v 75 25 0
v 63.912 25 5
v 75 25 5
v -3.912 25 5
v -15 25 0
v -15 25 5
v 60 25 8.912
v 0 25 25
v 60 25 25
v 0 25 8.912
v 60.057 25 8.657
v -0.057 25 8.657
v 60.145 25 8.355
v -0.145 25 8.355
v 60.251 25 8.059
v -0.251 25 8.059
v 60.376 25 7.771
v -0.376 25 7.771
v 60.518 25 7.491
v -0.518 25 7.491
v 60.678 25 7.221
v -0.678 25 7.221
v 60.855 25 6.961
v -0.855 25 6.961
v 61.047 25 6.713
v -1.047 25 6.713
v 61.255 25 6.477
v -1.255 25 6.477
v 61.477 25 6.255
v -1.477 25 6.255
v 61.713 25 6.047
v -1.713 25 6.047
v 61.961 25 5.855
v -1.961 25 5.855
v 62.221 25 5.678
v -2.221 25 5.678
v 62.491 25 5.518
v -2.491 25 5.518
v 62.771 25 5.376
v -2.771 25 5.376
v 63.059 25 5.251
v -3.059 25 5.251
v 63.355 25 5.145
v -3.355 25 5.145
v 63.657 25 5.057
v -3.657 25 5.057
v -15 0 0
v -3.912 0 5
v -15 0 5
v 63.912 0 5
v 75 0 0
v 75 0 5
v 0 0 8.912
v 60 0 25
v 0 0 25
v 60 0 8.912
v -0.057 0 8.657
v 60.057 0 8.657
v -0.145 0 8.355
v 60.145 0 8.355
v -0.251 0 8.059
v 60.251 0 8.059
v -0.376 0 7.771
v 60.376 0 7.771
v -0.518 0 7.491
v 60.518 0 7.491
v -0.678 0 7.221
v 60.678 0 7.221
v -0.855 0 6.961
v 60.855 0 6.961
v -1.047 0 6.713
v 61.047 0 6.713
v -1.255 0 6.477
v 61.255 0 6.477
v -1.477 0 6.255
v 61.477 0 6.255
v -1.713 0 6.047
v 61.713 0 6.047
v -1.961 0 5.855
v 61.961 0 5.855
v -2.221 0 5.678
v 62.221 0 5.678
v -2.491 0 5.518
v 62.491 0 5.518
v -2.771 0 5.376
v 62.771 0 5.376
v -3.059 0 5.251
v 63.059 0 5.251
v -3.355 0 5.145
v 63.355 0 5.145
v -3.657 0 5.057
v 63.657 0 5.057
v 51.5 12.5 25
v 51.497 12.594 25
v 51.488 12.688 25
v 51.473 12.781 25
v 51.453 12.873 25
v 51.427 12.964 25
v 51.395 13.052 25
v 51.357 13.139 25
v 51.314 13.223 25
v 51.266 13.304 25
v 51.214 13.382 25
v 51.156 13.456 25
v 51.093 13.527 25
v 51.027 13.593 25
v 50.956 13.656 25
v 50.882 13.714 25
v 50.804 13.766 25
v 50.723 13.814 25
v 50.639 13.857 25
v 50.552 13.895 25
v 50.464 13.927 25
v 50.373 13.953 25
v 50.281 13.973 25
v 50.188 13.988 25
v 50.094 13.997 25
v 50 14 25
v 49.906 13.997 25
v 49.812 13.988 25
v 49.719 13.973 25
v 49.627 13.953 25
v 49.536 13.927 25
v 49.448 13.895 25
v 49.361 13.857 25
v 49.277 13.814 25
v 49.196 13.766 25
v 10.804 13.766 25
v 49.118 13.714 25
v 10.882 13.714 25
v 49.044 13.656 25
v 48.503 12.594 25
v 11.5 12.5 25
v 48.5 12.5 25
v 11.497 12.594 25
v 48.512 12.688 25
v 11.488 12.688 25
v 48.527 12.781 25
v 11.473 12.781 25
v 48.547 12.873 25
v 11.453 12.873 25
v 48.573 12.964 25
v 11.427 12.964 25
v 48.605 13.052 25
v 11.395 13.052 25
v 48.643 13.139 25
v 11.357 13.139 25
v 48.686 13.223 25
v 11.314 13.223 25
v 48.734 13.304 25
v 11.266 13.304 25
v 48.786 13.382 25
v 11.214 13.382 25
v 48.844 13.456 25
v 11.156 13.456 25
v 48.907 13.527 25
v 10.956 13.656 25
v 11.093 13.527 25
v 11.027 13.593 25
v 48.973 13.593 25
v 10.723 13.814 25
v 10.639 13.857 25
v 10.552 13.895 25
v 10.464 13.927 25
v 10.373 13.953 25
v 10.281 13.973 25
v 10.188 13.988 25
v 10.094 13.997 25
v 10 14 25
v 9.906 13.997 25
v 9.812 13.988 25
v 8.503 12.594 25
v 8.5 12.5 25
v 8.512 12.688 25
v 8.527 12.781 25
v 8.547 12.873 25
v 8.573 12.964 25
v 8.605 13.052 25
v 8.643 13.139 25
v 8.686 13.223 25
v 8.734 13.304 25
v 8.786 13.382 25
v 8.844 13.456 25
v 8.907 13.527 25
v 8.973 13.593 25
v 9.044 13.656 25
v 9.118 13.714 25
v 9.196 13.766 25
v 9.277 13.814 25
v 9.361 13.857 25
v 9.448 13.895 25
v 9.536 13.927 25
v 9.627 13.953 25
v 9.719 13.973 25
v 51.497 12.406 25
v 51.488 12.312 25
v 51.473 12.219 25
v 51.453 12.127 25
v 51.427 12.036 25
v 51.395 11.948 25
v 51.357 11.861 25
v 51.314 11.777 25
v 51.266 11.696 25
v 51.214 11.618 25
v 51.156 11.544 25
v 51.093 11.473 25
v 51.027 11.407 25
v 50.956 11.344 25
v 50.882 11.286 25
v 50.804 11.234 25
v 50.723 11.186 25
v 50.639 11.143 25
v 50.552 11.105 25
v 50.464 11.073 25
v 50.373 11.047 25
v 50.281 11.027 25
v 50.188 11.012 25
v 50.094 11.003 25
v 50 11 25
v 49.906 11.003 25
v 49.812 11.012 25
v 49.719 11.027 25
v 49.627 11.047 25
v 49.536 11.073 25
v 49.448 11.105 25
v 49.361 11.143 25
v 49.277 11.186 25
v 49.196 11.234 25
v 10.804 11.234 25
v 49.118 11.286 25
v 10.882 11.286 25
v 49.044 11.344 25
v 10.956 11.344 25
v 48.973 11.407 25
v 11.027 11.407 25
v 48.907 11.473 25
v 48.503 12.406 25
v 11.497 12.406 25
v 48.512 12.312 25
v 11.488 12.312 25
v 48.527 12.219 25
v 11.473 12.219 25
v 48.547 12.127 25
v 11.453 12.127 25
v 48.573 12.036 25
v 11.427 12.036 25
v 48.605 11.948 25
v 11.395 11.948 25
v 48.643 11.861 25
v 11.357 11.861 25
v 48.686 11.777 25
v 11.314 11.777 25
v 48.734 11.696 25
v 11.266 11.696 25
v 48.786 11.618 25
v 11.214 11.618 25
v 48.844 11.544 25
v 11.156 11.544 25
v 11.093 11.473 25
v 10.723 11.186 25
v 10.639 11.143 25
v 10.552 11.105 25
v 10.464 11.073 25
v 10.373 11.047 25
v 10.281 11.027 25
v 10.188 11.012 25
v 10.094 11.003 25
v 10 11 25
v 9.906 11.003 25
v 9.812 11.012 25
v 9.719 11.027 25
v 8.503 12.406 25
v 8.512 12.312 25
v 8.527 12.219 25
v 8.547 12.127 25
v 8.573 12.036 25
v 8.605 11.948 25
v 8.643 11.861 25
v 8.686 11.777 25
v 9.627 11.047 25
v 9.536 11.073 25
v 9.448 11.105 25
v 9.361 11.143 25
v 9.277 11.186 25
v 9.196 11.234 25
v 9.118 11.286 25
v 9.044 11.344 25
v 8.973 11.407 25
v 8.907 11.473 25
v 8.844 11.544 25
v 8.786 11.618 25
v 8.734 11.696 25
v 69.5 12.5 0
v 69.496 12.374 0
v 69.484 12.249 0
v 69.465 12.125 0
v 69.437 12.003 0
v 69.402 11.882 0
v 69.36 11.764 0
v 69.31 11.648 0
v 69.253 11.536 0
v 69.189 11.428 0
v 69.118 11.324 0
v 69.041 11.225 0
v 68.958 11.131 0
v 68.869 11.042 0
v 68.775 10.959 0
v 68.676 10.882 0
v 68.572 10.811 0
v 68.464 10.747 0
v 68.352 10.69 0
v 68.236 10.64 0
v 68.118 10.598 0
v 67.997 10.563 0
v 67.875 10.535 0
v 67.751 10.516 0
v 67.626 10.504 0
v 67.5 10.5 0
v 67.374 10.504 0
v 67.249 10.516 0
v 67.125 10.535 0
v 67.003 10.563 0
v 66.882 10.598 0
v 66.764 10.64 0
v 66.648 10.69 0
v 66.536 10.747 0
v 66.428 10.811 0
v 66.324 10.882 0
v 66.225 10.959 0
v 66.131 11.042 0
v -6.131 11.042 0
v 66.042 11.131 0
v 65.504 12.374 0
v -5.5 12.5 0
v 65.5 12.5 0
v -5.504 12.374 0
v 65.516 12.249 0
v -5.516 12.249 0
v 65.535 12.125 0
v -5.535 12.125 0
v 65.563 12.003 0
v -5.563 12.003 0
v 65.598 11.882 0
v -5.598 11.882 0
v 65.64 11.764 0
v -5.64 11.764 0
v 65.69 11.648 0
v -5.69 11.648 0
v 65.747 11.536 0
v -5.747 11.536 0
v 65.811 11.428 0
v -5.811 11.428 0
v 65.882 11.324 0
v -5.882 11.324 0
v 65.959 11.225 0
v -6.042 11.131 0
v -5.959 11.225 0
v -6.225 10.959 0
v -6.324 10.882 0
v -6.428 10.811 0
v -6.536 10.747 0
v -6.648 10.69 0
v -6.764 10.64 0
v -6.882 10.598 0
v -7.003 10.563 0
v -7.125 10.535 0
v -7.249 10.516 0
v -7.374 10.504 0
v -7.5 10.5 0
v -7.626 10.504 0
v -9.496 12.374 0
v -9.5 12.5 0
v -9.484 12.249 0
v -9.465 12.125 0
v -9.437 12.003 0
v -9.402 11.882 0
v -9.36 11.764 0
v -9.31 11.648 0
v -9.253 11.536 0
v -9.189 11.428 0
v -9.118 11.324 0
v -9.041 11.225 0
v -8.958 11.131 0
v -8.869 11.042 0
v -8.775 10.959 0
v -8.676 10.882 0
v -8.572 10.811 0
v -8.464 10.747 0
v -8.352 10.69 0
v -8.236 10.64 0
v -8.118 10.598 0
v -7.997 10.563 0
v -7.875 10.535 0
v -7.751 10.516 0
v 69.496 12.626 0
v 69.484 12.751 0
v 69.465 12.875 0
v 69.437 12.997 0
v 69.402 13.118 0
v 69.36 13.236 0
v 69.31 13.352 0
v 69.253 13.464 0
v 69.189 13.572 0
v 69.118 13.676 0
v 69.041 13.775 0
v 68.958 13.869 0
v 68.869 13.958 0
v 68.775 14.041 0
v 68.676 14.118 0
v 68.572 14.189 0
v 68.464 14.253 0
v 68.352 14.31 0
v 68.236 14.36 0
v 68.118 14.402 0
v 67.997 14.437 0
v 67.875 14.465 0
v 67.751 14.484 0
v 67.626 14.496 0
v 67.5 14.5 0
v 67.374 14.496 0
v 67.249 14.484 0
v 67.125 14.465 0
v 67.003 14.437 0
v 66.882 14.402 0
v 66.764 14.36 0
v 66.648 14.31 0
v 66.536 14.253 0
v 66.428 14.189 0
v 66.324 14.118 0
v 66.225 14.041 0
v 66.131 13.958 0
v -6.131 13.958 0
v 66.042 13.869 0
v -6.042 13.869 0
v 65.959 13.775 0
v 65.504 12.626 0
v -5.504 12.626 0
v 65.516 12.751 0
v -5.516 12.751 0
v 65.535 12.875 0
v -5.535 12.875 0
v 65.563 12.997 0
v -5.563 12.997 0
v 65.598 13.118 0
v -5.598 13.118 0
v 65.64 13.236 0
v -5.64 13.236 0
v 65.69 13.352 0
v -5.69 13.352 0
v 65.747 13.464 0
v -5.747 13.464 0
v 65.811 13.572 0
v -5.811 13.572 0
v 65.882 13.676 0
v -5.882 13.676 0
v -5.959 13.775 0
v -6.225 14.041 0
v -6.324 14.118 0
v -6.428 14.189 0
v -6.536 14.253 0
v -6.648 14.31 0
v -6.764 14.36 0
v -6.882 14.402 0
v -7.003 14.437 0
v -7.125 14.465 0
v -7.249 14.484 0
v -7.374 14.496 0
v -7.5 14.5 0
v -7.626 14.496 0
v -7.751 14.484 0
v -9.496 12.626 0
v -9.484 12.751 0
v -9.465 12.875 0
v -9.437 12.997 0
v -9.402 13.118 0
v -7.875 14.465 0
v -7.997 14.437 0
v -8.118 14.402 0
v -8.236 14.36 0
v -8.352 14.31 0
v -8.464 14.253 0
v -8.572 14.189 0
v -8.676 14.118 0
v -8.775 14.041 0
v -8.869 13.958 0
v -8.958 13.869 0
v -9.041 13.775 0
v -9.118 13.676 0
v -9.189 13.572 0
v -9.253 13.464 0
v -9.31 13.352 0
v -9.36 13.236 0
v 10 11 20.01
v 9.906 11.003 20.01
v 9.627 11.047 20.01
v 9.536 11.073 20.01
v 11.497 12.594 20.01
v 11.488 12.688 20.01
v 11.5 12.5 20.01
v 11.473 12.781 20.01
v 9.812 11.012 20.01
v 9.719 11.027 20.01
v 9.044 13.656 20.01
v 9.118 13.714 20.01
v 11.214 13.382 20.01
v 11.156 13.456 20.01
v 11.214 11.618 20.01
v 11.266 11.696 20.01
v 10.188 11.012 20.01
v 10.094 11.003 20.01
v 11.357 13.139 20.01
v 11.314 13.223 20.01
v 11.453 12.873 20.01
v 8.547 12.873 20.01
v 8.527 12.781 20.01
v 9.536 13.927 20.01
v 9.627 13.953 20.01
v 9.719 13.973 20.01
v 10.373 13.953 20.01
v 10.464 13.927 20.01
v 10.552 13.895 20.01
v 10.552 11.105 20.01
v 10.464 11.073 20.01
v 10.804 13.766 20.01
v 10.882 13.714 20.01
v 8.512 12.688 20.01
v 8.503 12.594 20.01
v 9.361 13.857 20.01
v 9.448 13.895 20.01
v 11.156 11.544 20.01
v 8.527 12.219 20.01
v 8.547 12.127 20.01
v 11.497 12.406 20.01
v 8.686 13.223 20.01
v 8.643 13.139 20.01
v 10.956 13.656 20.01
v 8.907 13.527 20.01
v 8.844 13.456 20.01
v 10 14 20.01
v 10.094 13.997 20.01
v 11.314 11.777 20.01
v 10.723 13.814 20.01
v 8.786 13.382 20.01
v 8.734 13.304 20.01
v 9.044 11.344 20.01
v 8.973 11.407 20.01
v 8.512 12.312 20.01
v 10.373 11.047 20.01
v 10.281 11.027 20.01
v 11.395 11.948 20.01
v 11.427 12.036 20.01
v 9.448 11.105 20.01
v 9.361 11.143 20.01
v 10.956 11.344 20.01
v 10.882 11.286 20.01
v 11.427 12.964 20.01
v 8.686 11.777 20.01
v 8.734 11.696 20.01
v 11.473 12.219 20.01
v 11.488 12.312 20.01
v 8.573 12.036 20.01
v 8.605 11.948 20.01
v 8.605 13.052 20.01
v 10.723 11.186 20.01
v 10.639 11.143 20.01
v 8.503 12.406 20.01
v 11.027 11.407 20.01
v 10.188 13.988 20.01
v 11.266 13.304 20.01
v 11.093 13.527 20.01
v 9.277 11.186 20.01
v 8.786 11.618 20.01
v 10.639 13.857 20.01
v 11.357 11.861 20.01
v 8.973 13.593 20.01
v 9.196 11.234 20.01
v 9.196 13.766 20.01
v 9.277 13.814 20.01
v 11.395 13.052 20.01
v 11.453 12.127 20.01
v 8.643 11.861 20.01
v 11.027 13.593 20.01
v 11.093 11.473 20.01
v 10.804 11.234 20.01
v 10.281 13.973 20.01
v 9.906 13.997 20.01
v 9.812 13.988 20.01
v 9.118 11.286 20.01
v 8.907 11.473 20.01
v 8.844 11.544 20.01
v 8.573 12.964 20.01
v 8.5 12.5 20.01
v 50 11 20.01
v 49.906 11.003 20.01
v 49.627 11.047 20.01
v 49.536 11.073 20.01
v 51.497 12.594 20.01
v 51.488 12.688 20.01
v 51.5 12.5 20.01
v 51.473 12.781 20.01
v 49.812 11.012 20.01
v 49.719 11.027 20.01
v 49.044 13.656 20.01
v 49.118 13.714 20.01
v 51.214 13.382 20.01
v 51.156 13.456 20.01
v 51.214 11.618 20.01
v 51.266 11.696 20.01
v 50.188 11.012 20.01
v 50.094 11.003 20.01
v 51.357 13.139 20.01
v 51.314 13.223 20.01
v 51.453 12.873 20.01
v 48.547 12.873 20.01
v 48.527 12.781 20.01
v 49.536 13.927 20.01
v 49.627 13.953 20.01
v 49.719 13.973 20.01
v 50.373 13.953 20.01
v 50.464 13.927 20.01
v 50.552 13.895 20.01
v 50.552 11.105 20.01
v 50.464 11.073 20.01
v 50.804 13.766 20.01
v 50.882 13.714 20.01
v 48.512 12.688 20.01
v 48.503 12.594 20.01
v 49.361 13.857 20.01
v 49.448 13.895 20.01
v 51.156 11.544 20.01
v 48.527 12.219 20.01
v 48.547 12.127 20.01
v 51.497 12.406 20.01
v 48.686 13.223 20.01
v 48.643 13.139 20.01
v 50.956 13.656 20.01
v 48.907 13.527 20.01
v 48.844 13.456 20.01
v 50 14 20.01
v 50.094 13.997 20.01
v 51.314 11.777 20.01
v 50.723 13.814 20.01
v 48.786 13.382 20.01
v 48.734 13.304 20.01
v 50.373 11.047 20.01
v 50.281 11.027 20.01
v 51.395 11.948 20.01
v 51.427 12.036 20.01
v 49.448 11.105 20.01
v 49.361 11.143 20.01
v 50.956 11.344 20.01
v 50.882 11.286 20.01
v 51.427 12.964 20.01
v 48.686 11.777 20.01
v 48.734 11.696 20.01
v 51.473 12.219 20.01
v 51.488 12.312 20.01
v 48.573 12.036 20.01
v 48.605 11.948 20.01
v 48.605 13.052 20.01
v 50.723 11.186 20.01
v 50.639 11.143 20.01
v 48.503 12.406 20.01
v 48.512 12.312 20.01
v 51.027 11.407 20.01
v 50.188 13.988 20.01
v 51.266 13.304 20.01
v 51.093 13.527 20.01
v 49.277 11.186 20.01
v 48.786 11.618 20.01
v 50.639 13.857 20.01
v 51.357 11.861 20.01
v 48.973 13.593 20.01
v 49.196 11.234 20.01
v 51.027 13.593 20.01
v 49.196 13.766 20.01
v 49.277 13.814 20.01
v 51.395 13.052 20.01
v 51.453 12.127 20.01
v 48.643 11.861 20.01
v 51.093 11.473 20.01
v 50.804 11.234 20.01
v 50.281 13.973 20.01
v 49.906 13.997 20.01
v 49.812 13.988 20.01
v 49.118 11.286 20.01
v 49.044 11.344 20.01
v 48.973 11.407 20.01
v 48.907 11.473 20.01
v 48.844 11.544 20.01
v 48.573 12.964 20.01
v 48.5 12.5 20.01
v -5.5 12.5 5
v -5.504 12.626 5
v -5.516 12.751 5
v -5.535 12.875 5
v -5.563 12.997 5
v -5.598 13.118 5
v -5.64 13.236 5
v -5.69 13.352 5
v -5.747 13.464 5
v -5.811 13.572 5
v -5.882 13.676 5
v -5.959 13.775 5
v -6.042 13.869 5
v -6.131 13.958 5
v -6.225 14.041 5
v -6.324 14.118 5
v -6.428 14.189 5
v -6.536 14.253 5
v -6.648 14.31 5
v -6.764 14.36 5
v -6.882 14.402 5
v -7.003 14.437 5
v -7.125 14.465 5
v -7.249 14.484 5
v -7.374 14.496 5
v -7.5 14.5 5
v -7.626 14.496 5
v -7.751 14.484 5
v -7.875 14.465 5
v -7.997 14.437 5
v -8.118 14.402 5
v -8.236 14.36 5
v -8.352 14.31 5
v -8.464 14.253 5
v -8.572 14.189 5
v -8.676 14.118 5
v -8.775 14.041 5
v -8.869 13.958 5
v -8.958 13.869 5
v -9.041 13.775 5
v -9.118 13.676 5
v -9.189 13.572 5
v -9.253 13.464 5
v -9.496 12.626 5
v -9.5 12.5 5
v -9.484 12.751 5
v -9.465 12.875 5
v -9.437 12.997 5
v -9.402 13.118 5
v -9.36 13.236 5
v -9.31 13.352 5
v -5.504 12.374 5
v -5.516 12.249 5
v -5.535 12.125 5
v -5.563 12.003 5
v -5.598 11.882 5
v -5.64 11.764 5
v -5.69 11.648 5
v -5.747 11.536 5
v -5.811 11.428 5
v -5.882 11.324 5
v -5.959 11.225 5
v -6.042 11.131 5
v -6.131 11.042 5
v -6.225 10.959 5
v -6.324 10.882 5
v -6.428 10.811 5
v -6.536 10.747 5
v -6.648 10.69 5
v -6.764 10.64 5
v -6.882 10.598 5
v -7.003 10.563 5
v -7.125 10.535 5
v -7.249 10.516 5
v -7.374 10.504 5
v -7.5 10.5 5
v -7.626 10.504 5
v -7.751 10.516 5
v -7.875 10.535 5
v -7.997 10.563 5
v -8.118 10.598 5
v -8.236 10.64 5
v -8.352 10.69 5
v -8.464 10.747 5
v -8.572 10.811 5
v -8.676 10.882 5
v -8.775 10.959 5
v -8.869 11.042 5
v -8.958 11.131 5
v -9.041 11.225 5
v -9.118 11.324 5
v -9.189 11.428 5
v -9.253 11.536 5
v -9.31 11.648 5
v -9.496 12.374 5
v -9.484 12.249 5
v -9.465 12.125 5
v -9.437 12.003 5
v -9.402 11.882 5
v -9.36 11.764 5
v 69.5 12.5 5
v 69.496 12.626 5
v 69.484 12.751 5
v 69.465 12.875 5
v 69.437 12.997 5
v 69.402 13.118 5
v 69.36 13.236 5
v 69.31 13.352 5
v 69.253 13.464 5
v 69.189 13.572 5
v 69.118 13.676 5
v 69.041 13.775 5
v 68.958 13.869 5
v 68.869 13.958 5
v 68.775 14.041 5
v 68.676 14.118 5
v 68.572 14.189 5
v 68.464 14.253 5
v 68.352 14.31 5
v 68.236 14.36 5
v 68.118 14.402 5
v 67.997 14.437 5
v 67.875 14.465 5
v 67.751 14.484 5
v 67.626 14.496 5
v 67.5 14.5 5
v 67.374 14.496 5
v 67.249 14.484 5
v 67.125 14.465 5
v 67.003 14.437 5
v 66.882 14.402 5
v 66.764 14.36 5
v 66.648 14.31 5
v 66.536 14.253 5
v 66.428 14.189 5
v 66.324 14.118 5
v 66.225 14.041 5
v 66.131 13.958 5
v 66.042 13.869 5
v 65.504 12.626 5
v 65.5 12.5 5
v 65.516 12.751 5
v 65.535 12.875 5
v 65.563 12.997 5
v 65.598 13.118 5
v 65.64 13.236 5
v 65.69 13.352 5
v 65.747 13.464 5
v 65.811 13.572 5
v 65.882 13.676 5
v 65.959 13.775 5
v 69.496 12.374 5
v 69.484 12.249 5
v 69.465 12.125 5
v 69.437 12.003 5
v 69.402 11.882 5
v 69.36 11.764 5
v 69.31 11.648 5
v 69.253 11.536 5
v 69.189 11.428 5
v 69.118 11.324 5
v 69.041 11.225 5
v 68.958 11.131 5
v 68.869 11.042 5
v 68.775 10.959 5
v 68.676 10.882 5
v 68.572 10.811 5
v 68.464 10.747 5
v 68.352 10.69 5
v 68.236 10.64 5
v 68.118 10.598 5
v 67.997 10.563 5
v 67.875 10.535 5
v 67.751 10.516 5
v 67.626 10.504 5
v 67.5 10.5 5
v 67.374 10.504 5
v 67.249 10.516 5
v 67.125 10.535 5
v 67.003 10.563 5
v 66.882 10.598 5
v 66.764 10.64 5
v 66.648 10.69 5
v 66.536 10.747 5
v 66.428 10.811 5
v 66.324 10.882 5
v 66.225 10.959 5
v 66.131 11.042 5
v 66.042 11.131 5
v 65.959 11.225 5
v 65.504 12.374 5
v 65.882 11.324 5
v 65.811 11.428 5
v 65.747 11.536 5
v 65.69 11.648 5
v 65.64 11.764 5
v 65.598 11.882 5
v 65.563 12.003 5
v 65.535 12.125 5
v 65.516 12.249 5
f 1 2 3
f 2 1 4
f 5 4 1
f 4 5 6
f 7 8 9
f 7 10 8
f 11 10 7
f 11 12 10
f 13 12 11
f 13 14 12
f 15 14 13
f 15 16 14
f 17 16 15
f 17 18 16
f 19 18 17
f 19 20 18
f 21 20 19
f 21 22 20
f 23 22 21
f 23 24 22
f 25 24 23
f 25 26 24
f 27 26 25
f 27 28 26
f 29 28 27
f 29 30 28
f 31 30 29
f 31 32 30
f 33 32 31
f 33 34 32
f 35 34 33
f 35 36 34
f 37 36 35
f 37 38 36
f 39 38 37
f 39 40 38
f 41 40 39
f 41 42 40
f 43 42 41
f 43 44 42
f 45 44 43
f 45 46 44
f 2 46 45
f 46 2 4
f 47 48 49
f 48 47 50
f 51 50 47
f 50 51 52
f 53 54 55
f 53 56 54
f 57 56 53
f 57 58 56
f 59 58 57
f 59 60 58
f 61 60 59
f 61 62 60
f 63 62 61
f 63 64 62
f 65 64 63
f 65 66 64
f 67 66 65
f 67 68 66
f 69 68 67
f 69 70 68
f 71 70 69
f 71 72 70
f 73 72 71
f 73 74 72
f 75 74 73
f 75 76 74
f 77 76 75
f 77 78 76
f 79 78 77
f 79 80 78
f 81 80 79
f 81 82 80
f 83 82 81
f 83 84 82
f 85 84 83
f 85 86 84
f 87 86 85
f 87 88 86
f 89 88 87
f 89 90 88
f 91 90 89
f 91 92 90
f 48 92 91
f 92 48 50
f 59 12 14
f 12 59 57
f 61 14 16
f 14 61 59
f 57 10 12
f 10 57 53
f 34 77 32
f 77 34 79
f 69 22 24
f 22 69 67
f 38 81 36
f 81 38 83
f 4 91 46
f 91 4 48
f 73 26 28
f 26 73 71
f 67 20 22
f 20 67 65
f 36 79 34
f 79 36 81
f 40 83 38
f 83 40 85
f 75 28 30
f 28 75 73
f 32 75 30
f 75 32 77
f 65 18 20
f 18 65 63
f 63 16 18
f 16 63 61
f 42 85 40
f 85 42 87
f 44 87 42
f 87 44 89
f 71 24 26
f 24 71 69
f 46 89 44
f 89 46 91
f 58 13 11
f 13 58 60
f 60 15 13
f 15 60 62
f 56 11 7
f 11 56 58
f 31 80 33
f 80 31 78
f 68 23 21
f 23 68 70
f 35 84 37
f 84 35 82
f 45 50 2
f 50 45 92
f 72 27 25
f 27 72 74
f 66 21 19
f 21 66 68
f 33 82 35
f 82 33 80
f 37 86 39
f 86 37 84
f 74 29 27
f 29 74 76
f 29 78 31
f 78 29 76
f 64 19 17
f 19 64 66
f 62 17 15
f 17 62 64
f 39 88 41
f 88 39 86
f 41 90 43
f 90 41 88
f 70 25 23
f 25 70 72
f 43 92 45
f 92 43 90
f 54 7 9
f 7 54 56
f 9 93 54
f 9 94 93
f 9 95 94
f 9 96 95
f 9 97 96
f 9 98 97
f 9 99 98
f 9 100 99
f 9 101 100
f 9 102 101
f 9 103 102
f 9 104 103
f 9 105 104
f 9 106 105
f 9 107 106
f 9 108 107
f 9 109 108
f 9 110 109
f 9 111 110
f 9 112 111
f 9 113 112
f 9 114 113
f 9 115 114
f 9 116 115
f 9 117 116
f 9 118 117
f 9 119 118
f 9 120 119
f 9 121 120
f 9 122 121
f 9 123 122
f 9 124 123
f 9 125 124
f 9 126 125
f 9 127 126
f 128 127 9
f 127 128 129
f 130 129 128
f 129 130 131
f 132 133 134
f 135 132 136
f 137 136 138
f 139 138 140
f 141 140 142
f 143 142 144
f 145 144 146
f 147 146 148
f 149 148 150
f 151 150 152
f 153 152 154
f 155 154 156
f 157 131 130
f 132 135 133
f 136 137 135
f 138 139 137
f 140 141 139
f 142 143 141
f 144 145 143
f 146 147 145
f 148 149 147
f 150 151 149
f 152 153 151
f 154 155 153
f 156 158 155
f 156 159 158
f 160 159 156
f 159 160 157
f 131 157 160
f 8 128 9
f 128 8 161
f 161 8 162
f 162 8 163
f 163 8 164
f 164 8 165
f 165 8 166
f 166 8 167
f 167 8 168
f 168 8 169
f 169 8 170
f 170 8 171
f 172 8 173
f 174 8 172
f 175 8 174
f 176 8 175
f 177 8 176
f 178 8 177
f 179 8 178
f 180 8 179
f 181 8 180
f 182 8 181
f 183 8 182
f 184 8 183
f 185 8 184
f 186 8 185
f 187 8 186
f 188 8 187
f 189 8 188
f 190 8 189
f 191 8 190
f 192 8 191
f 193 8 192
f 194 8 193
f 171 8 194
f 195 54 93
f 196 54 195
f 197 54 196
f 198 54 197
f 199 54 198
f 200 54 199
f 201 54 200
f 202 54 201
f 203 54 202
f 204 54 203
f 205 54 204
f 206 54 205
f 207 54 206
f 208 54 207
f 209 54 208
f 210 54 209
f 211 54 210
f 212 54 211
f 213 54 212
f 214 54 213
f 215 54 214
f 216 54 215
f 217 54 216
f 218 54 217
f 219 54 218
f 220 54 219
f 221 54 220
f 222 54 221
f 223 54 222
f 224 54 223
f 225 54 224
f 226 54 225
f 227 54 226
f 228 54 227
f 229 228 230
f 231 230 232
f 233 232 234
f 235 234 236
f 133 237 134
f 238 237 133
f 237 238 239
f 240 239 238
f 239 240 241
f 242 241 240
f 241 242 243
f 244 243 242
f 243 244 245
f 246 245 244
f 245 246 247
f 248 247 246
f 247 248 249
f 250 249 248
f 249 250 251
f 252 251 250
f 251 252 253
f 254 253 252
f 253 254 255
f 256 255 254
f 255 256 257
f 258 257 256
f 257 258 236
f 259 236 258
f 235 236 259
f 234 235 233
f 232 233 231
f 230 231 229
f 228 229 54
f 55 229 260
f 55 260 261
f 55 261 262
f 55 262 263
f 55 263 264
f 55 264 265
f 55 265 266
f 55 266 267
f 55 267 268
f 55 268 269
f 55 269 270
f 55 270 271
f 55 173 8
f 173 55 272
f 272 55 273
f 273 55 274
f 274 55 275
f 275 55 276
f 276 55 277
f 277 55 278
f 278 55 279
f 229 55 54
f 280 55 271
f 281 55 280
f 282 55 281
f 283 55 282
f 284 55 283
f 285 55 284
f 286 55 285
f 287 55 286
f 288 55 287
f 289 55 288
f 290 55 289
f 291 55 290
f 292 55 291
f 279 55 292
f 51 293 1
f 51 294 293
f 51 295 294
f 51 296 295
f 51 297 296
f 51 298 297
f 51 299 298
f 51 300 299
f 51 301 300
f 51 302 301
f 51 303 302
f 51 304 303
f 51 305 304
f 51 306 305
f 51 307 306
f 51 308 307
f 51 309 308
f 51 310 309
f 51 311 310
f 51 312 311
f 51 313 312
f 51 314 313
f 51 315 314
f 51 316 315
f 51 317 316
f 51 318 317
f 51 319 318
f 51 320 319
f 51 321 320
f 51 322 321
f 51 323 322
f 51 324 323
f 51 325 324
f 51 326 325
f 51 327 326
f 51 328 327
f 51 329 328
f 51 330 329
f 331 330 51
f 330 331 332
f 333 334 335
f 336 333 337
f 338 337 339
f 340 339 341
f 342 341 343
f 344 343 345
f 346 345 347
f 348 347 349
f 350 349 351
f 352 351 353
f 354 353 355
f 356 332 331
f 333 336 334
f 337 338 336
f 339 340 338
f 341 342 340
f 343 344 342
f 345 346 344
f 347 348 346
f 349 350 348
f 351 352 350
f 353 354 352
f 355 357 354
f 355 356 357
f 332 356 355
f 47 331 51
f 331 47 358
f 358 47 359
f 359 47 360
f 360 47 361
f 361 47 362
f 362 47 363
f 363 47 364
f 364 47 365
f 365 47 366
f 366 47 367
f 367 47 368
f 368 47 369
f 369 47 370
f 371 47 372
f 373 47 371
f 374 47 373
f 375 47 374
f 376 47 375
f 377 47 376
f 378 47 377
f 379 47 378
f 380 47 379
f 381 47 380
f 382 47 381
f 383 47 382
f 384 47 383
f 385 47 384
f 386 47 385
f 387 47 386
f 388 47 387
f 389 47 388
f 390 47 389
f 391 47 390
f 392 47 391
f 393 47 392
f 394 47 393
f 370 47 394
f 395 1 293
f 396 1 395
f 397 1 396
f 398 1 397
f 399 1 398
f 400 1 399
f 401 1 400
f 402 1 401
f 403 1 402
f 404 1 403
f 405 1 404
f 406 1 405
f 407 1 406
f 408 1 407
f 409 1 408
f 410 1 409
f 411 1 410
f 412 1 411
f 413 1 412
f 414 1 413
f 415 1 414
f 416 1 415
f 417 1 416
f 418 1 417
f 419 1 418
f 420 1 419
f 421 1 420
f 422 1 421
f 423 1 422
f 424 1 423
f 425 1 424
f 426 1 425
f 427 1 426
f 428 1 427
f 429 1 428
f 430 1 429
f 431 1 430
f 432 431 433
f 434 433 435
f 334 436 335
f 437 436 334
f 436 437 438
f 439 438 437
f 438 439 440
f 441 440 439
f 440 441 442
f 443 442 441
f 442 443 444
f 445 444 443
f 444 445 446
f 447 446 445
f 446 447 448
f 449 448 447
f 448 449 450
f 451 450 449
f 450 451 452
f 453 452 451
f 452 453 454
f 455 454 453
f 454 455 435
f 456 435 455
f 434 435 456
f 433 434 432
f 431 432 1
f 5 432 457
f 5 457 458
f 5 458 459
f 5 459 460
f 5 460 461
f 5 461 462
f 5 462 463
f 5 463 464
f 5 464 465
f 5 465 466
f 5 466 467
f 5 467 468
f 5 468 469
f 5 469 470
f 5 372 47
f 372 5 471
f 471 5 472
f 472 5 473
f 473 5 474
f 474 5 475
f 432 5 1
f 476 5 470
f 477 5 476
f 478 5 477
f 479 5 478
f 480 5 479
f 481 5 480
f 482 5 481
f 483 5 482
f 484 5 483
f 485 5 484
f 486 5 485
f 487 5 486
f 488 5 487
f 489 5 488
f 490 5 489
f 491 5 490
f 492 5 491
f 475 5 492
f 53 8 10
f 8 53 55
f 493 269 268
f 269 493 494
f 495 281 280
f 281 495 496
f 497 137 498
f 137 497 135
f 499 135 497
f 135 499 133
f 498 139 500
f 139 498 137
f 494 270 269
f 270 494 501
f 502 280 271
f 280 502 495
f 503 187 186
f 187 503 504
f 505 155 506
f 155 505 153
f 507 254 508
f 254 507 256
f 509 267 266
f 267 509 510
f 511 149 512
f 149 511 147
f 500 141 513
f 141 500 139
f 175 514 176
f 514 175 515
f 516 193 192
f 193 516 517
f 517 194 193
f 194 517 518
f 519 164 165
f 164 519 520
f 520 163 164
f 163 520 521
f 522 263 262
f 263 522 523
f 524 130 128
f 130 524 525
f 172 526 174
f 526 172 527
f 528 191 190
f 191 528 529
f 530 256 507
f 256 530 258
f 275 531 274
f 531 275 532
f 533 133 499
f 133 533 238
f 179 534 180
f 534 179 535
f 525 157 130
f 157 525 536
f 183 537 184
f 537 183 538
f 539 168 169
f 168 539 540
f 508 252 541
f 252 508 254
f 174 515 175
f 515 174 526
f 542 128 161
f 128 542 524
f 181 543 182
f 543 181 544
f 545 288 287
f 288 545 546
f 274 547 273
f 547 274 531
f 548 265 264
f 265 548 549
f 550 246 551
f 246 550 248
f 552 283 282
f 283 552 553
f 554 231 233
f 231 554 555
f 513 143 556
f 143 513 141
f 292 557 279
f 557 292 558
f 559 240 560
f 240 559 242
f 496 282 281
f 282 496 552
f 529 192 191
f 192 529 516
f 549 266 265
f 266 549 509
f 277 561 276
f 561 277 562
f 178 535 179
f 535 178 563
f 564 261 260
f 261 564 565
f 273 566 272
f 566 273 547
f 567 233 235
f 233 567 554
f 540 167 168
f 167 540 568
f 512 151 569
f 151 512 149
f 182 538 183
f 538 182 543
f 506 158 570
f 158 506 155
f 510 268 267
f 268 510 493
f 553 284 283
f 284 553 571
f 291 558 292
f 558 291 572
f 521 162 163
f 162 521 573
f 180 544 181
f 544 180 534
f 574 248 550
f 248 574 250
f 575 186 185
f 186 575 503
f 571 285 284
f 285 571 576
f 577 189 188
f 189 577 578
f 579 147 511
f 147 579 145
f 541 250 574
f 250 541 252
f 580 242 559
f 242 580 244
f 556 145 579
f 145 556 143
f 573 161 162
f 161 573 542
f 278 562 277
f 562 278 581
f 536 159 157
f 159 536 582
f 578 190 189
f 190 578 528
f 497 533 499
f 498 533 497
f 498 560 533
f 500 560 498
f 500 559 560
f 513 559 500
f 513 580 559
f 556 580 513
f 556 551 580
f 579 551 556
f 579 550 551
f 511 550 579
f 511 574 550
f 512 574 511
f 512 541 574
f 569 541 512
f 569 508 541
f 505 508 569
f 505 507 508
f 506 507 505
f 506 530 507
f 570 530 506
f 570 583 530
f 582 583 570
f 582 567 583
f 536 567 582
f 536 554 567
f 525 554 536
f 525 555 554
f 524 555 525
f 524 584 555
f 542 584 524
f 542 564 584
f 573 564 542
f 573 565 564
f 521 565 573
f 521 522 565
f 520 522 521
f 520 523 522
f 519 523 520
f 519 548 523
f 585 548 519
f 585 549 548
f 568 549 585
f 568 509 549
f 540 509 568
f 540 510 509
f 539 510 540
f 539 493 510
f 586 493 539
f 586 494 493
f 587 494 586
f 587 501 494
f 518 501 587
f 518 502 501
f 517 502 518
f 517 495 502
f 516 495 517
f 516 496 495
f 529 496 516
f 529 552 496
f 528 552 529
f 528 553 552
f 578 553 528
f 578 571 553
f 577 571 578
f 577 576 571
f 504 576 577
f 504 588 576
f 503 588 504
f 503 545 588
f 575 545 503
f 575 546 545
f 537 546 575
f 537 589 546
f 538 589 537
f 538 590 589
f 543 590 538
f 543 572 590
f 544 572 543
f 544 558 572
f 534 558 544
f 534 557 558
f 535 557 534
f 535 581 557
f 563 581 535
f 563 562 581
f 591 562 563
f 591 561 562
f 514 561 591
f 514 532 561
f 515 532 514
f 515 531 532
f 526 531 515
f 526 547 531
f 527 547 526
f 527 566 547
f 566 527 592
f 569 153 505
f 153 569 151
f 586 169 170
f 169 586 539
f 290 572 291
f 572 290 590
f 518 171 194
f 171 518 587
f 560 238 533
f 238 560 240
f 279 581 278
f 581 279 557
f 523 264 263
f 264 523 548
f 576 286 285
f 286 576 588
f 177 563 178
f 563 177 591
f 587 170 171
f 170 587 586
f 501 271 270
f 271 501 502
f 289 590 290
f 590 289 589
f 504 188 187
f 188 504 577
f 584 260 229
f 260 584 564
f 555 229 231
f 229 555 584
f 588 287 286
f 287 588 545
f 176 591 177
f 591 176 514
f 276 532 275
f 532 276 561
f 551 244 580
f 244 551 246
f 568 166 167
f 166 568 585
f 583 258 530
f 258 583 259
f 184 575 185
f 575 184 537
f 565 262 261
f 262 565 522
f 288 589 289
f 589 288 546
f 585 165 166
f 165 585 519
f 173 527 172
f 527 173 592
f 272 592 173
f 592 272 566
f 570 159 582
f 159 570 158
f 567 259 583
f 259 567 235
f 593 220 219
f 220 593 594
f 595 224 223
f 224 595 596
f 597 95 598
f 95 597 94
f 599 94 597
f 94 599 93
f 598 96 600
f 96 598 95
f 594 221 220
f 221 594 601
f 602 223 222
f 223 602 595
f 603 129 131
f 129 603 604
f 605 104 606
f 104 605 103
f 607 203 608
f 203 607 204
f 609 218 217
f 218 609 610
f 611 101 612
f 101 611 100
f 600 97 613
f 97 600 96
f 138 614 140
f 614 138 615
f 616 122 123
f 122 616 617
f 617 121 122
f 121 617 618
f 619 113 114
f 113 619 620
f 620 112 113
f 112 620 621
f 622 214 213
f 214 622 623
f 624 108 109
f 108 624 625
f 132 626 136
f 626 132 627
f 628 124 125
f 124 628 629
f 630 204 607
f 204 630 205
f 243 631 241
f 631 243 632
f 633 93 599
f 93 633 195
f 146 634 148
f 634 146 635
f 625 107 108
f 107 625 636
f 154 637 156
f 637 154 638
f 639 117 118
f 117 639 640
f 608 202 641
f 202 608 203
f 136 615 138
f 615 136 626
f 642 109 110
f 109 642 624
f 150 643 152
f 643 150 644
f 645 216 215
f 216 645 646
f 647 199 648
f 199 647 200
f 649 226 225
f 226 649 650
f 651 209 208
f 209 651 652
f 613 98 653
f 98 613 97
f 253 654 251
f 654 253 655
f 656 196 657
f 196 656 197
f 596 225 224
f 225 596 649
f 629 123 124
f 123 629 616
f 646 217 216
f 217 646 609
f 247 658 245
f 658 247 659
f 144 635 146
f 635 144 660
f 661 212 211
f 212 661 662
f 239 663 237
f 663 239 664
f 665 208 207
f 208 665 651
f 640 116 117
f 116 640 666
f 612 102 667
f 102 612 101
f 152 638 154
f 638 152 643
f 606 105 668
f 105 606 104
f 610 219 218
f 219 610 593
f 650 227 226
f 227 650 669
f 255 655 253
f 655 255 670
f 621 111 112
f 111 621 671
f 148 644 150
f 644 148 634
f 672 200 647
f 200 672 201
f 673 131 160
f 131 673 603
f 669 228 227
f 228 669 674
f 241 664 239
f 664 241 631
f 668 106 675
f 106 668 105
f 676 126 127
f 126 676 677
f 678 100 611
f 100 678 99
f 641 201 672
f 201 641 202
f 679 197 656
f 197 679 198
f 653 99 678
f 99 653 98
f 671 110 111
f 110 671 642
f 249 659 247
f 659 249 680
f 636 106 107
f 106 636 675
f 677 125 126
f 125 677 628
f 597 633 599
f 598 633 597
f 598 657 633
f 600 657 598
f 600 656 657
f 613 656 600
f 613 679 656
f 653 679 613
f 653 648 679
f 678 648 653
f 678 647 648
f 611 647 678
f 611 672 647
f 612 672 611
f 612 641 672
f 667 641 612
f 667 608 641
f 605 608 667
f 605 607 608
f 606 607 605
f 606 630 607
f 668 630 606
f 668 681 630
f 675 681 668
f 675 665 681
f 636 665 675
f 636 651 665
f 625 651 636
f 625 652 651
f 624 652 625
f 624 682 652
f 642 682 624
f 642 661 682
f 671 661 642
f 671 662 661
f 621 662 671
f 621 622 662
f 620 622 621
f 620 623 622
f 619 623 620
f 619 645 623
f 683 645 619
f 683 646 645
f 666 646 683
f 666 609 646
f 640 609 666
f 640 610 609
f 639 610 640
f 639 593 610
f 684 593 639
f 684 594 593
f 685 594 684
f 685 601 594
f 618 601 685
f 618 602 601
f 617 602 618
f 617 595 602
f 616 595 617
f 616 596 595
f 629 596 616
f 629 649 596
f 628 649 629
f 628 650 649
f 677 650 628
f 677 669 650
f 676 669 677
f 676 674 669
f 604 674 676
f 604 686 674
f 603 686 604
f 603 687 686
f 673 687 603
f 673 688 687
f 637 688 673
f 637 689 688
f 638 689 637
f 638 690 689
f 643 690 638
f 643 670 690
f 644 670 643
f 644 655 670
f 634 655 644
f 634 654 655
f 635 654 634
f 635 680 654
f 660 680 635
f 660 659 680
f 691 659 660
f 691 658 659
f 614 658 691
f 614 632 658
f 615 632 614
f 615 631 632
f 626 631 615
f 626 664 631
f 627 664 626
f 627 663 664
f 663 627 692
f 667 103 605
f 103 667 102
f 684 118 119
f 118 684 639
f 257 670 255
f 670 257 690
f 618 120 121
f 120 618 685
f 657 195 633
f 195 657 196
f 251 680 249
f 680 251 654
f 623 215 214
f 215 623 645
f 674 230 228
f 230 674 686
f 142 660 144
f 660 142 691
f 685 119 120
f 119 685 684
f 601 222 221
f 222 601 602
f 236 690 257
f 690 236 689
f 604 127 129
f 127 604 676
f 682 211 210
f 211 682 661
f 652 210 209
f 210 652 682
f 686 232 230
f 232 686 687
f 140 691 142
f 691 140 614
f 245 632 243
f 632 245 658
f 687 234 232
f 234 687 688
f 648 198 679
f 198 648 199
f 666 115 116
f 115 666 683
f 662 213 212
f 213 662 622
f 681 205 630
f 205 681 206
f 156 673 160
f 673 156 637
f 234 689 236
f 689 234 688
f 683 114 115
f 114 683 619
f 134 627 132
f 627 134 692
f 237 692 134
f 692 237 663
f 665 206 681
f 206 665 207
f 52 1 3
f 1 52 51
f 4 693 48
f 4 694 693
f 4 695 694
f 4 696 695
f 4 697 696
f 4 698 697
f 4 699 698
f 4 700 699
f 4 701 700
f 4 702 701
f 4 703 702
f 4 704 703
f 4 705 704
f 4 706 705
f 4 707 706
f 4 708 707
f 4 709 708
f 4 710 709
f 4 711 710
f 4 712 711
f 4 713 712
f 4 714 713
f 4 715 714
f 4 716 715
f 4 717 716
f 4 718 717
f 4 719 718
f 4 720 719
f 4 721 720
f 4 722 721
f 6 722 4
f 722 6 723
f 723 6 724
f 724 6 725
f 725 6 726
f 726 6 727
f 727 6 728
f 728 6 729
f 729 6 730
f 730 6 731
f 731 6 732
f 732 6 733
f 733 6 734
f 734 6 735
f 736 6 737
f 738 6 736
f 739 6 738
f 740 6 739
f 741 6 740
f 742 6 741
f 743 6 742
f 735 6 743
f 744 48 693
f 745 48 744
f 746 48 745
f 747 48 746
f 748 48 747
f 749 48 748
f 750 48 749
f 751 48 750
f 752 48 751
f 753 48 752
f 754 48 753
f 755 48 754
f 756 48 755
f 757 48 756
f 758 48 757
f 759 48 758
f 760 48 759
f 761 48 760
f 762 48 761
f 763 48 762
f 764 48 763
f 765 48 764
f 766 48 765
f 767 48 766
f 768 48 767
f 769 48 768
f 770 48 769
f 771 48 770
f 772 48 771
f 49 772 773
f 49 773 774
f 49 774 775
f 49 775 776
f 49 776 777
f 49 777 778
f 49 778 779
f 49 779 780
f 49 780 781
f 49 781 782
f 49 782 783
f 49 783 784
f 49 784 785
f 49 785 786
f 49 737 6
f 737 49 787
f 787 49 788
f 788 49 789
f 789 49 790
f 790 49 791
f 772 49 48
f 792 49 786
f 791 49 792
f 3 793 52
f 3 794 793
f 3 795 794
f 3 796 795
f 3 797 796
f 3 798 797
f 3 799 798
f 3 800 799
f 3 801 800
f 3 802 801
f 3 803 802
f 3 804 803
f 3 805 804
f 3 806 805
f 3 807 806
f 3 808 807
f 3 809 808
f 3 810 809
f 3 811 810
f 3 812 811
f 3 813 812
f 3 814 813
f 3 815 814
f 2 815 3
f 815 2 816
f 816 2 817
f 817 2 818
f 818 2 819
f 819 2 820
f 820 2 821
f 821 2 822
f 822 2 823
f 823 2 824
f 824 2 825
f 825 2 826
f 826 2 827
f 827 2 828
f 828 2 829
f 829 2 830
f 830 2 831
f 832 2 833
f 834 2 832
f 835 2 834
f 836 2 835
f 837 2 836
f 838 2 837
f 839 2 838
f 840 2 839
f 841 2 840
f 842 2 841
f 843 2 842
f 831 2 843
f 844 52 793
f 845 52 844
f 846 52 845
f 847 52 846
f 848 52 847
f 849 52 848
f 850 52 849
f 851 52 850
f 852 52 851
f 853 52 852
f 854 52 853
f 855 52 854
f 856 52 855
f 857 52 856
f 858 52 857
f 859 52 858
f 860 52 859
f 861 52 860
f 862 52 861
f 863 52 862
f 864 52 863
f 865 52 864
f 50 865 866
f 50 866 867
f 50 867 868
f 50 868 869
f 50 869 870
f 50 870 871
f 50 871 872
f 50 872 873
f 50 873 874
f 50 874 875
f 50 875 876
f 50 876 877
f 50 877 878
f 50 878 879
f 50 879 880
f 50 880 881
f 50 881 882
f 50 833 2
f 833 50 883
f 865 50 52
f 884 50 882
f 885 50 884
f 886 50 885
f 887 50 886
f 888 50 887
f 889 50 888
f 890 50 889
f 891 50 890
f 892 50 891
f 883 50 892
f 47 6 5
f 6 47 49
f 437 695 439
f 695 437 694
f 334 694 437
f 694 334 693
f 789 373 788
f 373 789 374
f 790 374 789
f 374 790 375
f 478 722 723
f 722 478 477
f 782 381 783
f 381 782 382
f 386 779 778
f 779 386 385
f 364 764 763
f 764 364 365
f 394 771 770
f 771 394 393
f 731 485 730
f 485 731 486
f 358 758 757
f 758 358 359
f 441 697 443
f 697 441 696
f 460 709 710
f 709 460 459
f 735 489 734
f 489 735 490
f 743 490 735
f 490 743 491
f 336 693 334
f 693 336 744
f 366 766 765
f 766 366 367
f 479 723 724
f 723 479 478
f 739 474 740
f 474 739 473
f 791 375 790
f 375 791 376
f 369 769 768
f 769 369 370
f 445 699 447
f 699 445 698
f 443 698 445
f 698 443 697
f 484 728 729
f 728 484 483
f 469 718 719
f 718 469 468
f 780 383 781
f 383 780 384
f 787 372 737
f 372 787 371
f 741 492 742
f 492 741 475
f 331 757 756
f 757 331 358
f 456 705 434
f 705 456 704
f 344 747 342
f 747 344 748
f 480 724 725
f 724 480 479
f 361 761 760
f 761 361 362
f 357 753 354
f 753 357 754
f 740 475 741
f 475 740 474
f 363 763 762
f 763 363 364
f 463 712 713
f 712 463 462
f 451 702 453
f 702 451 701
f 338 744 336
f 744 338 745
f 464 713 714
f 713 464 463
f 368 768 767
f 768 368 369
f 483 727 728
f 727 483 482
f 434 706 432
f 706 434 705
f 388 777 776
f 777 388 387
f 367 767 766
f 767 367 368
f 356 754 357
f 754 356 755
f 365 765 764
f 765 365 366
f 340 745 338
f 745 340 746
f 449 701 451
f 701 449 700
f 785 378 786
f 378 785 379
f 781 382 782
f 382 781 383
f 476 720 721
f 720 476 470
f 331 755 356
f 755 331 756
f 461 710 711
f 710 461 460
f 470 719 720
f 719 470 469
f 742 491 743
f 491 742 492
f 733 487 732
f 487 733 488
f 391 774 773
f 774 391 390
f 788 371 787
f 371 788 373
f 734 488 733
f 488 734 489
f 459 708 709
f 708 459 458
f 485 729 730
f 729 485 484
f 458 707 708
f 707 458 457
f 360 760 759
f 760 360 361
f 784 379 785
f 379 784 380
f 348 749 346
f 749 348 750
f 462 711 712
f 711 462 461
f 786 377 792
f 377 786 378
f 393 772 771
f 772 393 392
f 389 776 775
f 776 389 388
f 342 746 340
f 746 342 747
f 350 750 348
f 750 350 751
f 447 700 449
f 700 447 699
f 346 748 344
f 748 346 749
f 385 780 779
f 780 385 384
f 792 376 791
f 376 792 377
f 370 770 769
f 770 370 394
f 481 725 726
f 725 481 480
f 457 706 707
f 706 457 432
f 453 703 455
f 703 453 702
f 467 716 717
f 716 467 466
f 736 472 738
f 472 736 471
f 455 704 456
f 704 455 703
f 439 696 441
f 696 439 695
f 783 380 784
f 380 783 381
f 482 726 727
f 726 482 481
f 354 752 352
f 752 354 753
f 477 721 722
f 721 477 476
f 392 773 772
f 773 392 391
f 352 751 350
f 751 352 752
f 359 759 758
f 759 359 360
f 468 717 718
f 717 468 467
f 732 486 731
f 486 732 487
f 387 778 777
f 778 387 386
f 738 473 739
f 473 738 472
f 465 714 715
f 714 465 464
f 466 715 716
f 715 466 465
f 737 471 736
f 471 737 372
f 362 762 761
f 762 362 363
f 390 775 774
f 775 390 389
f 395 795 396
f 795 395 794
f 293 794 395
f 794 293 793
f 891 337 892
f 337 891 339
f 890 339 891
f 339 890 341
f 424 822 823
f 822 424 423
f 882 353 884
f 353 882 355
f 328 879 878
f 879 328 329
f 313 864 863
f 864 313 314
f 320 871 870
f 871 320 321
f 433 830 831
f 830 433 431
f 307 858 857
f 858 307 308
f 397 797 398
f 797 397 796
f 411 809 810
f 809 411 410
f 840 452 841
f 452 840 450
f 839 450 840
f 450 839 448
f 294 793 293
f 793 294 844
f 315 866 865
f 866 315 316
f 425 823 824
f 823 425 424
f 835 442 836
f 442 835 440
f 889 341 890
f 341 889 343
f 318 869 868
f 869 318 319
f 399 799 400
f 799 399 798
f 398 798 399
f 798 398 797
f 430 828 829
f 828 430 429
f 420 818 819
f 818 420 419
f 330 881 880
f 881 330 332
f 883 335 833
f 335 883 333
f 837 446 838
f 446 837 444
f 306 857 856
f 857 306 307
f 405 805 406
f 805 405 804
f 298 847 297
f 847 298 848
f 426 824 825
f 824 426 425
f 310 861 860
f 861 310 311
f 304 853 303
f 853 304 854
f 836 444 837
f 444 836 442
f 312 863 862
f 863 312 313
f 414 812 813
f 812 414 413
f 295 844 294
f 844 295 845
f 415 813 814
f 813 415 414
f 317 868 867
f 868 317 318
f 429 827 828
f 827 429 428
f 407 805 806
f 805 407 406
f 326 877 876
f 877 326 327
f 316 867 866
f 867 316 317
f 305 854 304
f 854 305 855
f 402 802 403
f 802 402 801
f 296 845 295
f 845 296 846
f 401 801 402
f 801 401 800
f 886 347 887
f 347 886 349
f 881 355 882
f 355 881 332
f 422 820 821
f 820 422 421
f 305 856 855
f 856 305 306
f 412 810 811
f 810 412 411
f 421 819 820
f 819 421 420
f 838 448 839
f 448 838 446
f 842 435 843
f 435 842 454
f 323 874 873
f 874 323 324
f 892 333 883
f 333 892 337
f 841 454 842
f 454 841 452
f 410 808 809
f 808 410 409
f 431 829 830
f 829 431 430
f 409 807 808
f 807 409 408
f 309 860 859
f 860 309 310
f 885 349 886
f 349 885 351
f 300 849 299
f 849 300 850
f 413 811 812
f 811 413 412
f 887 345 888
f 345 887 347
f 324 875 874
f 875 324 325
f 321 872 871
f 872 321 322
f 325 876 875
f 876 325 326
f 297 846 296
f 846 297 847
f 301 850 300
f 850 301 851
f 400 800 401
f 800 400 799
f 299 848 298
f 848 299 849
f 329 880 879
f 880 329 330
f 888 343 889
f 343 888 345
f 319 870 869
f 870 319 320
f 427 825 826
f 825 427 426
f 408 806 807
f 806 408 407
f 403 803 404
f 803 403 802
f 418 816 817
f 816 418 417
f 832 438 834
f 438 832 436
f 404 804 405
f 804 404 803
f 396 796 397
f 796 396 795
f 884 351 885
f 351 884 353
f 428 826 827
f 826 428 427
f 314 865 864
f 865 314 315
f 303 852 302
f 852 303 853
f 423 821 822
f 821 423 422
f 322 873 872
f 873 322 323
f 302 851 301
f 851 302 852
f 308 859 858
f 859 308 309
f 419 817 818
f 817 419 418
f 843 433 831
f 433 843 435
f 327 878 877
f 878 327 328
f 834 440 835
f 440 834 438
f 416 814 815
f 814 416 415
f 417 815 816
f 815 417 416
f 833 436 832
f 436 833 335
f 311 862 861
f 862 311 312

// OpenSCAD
// file: configure.scad
/*
 * file: configure.scad
 * author: gregor binder <gregor_reprap@catrix.at>
 * date: 26.1.2014
 * last change: 26.1.2014
 * license: CC BY-NC-SA 4.0
 * changelog:
 *	- switched from freecad to openscad
 */

bottomwidth=60;
bottomheight=5;
depth=25;
height=100-bottomheight;
width=20;
holediameter=4;
thickness=3;
holderdepth=10;
$fn=100;

extender_width=90;
extender_height=25;
extender_top_hole=3;
extender_top_hole_depth=5;
extender_strengthening_d=10;
// main file
/*
 * file: prusa-i3-filament-holder-v2-extender.scad
 * author: gregor binder <gregor_reprap@catrix.at>
 * date: 26.1.2014
 * last change: 26.1.2014
 * license: CC BY-NC-SA 4.0
 */

include <configure.scad>

module strengthening() {
	translate([0,0,extender_strengthening_d/2])
	rotate([-90,0,0])
	difference() {
		cube([extender_strengthening_d/2,extender_strengthening_d/2,depth]);
		translate([0,0,-0.1])
			cylinder(h=depth+5,r=extender_strengthening_d/2);
	}
}

translate([-extender_strengthening_d/2+0.1,0,bottomheight-0.1])
strengthening();
rotate([0,0,180])
translate([-bottomwidth-extender_strengthening_d/2+0.1,-depth,bottomheight-0.1])
strengthening();

difference() {
	cube([bottomwidth,depth,extender_height]);
	translate([((bottomwidth-width)/2)/2,depth/2,extender_height-extender_top_hole_depth+0.01])
		cylinder(h=extender_top_hole_depth,r=extender_top_hole/2);
	translate([bottomwidth-(((bottomwidth-width)/2)/2),depth/2,extender_height-extender_top_hole_depth+0.01])
		cylinder(h=extender_top_hole_depth,r=extender_top_hole/2);
}

temp = (-extender_width/2)+bottomwidth/2;

translate([(-extender_width/2)+bottomwidth/2,0,0])
	difference() {
		cube([extender_width,depth,bottomheight]);
		translate([-temp/2,depth/2,-0.01])
			cylinder(h=bottomheight+5,r=holediameter/2);
		translate([extender_width+temp/2,depth/2,-0.01])
			cylinder(h=bottomheight+5,r=holediameter/2);
	}
